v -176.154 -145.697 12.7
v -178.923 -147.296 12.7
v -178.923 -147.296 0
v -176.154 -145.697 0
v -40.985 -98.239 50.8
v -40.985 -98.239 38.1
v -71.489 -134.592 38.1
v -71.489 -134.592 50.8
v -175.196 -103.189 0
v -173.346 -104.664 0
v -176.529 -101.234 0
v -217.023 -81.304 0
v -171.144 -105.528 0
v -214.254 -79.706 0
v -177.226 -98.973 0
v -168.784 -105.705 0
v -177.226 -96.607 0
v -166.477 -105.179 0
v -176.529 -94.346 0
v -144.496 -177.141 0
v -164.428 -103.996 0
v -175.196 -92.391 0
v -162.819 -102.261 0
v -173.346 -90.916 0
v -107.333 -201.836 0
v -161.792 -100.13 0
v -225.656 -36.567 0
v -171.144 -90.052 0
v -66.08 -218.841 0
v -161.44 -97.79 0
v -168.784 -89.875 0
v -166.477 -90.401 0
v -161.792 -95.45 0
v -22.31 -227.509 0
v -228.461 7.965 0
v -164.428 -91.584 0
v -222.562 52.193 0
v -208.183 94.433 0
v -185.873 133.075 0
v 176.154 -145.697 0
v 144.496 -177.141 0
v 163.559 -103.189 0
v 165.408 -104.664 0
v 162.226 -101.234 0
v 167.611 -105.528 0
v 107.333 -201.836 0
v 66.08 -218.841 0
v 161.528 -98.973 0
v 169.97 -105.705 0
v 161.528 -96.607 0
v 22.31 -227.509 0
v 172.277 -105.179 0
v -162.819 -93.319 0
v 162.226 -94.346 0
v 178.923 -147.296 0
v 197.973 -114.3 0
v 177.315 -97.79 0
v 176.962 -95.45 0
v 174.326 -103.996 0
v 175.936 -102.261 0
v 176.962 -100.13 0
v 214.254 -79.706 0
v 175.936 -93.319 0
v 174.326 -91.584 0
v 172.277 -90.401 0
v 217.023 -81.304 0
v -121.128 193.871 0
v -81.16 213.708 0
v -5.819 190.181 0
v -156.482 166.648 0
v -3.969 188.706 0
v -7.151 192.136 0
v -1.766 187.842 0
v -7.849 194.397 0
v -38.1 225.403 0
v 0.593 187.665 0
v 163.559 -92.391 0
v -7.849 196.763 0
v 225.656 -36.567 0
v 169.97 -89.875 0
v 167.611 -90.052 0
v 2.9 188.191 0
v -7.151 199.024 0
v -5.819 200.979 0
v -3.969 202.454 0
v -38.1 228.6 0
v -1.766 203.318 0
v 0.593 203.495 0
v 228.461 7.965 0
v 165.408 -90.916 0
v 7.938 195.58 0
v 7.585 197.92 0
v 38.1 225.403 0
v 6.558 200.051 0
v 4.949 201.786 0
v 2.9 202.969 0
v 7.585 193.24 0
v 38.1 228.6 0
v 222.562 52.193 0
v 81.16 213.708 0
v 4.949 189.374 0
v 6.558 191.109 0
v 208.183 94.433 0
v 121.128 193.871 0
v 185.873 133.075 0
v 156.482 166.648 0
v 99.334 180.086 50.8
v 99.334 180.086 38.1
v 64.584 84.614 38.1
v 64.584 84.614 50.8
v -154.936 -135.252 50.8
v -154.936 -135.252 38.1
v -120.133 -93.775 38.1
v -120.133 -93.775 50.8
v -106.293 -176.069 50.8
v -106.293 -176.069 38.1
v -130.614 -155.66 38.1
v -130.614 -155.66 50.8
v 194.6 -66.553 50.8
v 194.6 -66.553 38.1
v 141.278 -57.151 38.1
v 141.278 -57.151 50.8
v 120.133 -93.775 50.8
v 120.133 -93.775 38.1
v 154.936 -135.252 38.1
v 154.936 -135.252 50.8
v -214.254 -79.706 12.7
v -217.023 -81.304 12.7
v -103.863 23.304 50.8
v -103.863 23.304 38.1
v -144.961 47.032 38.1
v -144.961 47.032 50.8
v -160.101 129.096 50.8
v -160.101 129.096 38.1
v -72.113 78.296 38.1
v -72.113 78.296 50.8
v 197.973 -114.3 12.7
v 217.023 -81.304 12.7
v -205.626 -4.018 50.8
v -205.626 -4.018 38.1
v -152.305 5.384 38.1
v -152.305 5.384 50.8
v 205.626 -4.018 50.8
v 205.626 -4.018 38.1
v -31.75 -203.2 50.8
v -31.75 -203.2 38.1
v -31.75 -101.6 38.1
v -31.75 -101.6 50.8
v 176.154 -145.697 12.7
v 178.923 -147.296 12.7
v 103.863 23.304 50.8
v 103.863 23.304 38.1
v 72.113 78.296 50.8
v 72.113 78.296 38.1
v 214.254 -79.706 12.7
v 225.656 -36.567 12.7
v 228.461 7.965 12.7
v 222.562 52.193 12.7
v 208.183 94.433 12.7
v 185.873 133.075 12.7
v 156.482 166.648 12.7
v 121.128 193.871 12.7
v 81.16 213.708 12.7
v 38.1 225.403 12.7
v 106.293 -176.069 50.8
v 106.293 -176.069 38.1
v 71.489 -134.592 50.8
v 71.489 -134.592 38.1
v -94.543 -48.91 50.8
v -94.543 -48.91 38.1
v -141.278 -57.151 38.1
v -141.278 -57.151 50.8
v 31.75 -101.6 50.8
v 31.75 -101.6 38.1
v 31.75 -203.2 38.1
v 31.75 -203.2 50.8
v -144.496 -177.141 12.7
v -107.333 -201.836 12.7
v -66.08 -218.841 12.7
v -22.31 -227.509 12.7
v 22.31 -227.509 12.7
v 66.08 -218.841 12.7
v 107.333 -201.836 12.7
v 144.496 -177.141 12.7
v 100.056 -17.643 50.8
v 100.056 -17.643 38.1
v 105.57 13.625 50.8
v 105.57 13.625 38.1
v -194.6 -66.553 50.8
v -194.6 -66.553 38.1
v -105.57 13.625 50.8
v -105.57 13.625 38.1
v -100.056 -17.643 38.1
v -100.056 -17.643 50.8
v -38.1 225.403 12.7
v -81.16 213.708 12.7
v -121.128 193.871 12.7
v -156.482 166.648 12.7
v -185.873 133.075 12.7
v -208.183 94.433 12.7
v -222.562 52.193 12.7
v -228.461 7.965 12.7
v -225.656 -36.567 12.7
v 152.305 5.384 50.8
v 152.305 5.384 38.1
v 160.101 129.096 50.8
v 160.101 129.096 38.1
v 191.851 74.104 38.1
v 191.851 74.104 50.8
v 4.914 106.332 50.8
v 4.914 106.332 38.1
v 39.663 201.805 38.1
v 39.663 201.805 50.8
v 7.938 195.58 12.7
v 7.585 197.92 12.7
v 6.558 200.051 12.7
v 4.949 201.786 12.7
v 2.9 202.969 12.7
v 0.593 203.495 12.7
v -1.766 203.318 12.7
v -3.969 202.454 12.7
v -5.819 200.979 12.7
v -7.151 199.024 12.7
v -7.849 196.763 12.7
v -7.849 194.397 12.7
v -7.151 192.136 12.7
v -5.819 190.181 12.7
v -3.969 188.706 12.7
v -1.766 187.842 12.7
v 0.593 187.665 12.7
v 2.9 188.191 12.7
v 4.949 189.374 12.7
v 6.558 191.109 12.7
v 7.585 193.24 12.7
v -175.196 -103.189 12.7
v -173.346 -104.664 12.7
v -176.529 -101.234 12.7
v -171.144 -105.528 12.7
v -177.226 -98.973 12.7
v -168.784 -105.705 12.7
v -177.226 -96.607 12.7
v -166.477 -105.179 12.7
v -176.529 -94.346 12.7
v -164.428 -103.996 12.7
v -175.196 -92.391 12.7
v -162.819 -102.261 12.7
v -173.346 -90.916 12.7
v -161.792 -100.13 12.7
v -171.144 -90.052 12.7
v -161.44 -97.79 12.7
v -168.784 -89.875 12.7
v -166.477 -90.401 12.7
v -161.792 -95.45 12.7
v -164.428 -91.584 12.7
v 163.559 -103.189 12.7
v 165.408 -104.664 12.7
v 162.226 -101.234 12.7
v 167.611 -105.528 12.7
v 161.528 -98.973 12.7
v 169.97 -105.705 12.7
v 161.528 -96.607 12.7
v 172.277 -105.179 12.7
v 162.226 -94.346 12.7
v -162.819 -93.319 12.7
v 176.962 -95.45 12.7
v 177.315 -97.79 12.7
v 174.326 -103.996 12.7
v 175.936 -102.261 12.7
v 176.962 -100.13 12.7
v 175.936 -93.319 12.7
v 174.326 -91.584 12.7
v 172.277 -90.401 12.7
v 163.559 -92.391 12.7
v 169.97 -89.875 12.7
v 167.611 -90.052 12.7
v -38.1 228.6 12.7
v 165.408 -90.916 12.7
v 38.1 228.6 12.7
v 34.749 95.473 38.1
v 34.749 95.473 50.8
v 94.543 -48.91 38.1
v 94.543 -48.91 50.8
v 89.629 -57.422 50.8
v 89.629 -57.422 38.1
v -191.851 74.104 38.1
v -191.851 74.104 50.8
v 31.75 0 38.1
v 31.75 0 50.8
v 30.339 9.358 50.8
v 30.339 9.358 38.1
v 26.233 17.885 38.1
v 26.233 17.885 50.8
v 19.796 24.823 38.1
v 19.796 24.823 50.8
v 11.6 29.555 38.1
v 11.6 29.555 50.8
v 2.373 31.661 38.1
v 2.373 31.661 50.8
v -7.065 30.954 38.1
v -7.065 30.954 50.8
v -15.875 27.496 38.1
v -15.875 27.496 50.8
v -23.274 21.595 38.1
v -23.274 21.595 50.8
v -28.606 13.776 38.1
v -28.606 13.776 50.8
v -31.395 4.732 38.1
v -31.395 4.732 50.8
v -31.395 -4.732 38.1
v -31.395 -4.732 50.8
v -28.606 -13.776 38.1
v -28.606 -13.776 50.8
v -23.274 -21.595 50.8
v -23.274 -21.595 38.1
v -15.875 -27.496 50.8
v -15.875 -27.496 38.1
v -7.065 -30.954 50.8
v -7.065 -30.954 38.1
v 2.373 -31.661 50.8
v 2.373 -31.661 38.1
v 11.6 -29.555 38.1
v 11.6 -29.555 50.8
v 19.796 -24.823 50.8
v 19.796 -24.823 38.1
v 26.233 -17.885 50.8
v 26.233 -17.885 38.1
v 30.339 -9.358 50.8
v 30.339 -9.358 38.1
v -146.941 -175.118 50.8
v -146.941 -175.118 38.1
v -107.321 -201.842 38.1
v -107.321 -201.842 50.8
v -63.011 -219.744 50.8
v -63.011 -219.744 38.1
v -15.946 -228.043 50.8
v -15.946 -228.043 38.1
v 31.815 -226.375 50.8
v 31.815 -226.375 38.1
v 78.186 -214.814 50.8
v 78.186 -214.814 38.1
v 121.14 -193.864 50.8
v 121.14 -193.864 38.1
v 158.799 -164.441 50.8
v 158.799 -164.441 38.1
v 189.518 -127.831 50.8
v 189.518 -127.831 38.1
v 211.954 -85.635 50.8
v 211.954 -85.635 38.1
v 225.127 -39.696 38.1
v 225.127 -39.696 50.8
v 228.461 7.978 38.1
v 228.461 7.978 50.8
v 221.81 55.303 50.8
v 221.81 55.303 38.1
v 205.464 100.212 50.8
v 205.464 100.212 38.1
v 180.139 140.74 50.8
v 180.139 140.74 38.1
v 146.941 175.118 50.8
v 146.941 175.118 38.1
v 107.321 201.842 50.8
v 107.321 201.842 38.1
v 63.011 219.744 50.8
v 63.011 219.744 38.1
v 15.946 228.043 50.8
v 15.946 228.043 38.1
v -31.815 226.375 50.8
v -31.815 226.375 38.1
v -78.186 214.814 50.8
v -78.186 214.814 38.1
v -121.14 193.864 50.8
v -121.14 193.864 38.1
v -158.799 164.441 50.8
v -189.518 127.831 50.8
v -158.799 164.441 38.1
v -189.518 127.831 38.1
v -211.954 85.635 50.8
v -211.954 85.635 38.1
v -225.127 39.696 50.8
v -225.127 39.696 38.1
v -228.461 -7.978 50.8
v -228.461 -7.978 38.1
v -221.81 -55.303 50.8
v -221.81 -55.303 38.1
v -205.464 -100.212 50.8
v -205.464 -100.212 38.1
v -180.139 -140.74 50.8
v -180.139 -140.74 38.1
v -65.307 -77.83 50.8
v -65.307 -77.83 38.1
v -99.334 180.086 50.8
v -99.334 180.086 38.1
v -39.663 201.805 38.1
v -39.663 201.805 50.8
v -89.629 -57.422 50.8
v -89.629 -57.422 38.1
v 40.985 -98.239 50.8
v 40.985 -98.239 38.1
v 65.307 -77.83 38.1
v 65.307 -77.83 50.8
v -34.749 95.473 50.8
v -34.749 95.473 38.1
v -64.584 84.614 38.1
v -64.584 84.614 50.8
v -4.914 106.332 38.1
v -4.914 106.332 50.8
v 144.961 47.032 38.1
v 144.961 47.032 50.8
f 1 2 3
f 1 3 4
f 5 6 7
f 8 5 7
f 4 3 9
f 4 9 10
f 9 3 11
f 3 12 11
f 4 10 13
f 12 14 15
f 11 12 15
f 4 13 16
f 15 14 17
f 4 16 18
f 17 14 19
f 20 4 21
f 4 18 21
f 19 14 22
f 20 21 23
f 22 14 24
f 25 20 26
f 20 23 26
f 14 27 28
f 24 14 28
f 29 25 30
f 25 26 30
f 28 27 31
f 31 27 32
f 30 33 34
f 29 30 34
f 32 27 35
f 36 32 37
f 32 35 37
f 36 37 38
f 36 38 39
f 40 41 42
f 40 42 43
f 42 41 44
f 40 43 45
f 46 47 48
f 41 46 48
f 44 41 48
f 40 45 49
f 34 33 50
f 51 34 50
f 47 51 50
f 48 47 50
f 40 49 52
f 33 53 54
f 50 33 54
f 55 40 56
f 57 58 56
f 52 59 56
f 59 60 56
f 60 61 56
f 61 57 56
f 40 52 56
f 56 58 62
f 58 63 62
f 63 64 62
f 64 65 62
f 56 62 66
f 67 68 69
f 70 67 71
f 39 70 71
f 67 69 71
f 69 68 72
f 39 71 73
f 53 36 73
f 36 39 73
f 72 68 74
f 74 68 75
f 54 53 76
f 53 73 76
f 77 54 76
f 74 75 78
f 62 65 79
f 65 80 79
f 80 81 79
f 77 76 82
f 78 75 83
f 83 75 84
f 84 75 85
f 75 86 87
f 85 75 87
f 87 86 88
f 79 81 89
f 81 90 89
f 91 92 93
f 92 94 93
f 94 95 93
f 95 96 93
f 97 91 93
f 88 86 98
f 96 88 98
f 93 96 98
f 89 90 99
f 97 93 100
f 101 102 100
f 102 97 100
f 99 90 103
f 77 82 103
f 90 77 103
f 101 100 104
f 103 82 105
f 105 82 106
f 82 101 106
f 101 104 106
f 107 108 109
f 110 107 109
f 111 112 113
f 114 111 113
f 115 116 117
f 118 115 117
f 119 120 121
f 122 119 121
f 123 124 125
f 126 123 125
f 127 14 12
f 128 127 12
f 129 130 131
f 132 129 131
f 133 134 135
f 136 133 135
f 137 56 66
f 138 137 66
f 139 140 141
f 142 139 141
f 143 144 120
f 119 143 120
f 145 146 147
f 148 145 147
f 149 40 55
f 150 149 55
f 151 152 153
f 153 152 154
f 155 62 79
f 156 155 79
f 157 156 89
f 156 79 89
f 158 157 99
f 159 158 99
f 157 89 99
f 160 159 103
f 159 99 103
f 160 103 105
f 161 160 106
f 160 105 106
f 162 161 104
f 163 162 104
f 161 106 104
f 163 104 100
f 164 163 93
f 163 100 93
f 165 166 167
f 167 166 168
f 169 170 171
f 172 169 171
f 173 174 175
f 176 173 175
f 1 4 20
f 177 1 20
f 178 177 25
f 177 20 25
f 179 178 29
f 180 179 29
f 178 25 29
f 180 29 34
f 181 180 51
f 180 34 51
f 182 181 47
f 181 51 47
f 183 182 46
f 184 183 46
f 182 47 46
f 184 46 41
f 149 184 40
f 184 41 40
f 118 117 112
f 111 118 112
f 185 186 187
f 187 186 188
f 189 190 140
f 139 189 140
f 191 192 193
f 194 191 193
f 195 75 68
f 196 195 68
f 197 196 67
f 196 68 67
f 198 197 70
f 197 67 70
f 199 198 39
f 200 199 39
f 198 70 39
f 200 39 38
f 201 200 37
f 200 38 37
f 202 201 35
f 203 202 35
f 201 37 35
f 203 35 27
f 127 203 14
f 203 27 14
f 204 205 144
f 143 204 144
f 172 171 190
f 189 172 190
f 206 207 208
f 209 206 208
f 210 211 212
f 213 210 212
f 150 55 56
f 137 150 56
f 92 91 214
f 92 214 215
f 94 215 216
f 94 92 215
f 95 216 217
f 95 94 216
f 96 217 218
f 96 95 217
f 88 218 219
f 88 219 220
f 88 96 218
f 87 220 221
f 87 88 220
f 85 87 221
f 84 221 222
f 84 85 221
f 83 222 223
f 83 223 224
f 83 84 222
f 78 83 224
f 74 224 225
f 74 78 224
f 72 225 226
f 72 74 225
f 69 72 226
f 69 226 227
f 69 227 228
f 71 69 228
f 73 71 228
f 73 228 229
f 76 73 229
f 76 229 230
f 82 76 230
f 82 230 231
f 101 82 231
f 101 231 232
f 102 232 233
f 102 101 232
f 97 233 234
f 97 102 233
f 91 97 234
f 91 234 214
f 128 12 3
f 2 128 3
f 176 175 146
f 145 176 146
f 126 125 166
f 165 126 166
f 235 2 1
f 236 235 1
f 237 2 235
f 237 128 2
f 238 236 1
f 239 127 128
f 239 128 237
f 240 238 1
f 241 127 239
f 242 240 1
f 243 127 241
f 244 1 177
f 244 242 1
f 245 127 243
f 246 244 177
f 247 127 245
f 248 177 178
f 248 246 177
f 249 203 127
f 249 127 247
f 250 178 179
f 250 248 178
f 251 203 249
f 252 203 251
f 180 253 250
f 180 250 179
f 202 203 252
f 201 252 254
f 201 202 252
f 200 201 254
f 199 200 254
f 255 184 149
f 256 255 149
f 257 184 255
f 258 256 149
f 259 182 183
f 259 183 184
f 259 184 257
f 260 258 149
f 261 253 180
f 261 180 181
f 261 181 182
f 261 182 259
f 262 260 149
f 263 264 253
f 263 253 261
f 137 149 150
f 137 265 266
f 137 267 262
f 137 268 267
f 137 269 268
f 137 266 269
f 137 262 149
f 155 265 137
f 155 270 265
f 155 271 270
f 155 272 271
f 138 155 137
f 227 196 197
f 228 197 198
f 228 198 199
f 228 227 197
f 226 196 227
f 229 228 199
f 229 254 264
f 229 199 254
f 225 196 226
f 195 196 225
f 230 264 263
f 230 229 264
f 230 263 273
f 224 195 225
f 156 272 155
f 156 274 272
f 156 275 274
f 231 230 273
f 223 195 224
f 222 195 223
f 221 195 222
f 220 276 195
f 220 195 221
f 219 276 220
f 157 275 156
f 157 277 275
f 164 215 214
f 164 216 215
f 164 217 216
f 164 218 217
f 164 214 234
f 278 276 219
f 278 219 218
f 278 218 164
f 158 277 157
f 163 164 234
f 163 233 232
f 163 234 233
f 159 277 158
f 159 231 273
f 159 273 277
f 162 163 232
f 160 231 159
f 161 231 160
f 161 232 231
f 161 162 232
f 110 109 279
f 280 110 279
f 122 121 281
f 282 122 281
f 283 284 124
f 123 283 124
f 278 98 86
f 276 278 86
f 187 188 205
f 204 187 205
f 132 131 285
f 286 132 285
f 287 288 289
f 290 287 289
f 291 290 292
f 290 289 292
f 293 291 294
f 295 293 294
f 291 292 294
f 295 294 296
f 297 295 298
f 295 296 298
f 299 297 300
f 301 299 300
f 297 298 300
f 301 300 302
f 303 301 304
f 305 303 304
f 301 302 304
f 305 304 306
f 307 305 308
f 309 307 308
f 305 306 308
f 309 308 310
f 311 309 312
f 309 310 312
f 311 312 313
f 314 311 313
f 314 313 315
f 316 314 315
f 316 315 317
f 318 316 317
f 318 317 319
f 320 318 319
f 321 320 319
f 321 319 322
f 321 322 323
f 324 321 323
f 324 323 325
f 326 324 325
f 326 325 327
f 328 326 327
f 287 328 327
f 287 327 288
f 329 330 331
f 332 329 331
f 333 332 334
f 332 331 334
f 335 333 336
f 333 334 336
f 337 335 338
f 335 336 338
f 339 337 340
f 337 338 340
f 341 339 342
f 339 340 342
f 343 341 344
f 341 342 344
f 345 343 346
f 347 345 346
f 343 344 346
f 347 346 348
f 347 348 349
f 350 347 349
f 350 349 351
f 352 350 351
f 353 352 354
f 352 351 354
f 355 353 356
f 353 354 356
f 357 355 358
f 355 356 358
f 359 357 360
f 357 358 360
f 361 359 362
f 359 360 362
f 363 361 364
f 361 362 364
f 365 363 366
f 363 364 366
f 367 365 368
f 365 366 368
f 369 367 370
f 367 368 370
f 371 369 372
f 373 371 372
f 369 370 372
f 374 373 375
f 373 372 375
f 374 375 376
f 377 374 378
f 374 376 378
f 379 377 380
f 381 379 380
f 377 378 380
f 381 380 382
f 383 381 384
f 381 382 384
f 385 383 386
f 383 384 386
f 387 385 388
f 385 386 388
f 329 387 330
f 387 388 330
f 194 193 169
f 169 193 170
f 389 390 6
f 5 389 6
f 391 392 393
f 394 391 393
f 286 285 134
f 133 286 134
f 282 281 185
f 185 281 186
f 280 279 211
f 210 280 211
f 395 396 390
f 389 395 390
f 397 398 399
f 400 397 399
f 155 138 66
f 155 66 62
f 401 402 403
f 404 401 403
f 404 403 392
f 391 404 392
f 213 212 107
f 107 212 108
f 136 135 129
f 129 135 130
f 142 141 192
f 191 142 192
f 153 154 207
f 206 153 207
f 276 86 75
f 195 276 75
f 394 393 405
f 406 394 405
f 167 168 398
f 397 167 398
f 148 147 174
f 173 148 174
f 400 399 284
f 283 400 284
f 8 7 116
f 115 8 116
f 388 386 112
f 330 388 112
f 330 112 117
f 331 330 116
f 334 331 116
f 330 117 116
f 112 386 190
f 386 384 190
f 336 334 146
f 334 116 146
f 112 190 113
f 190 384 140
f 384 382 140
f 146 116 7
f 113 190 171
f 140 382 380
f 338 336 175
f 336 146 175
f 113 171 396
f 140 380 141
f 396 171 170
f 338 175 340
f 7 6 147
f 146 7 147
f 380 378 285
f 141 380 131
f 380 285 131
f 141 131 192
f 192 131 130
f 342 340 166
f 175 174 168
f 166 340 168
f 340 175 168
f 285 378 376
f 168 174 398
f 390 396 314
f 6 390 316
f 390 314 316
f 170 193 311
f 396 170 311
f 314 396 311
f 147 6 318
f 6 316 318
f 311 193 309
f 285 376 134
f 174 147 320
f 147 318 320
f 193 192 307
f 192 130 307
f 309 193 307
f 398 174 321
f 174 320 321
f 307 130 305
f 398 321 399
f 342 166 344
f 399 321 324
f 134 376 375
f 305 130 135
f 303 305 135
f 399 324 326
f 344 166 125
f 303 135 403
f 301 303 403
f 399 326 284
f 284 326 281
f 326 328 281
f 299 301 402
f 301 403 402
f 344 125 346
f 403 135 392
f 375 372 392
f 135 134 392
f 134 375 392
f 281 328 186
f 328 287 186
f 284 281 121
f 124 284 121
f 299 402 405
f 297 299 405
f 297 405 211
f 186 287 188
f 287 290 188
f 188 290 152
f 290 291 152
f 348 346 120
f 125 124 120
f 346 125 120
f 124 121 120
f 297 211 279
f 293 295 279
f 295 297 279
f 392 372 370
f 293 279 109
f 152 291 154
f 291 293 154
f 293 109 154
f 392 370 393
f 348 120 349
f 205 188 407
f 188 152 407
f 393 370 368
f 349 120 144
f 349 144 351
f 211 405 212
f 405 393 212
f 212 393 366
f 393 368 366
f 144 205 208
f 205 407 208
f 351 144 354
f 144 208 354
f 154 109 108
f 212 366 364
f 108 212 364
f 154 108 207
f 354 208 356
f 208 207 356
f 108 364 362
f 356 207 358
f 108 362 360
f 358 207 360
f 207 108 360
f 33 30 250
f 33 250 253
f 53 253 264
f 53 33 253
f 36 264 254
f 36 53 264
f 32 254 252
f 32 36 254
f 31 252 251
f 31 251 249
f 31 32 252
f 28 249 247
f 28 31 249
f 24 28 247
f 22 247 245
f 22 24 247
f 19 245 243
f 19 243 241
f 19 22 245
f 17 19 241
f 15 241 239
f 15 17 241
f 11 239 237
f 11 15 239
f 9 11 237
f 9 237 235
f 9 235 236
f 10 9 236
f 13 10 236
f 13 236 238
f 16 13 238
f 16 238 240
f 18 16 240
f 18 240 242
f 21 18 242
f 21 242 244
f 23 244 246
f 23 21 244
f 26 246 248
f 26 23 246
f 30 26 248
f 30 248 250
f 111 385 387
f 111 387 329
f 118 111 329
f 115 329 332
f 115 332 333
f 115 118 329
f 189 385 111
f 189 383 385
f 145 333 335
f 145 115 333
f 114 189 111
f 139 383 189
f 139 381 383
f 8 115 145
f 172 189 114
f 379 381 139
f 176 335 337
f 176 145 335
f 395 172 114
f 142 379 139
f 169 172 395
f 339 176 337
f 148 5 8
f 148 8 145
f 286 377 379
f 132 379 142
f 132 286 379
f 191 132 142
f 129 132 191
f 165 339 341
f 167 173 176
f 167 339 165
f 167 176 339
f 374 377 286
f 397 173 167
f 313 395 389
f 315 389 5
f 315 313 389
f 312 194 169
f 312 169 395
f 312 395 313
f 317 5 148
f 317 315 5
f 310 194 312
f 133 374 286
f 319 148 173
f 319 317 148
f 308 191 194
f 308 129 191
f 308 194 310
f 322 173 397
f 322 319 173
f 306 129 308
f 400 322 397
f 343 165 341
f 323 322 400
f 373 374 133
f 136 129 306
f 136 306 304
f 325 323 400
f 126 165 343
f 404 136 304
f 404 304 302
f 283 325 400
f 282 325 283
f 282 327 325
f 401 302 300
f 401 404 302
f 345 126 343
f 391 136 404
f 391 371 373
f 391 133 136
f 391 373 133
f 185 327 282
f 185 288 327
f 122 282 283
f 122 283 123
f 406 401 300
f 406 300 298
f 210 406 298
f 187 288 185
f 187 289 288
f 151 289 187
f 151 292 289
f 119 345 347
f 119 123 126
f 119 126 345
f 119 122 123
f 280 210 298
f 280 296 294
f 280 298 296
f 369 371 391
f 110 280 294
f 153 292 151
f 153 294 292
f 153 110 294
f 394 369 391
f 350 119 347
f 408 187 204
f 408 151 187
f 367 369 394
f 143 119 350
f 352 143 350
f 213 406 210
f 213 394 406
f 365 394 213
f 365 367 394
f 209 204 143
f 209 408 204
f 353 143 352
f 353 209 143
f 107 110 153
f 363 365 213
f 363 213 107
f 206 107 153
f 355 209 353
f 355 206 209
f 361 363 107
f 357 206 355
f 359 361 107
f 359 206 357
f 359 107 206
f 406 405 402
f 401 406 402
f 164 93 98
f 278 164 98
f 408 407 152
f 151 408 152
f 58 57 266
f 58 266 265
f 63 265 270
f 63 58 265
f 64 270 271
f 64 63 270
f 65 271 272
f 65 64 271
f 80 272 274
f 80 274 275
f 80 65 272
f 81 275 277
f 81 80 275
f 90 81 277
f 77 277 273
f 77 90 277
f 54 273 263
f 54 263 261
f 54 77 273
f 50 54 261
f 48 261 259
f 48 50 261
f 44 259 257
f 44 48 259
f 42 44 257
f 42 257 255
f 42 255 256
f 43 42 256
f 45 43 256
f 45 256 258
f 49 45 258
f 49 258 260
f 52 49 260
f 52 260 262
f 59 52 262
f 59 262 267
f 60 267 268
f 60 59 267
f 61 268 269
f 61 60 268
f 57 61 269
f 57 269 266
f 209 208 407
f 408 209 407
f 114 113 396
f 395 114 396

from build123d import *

# Parameters (mm, degrees)
F0_R     = 7.9375
F1_DEPTH = 12.7
F2_R     = 7.9375
F3_DEPTH = 12.7
F6_DEPTH = 12.7
F7_R     = 31.75
F8_DEPTH = 25.4


with BuildPart() as f1:
    # F0 (on Top) → F1 (new body)
    with BuildSketch(Plane.XY):
        with BuildLine():
            Line((-38.1, 225.4026397361), (-38.1, 147.5606654905))
            ThreePointArc((-38.1, 147.5606654905), (-131.9822715367, 76.2), (-146.8412849141, -40.7847648611))
            Line((-146.8412849141, -40.7847648611), (-214.2544120915, -79.7057519839))
            ThreePointArc((-214.2544120915, -79.7057519839), (-206.8384260613, -97.343851909), (-197.9734085849, -114.2999977833))
            ThreePointArc((-197.9734085849, -114.2999977833), (-187.7214631468, -130.4554033915), (-176.1544120915, -145.6968877522))
            Line((-176.1544120915, -145.6968877522), (-108.7412849141, -106.7759006294))
            ThreePointArc((-108.7412849141, -106.7759006294), (0, -152.4), (108.7412849141, -106.7759006294))
            Line((108.7412849141, -106.7759006294), (176.1544120915, -145.6968877522))
            ThreePointArc((176.1544120915, -145.6968877522), (187.7214632552, -130.4554032355), (197.973408775, -114.2999974542))
            ThreePointArc((197.973408775, -114.2999974542), (206.8384261422, -97.343851737), (214.2544120915, -79.7057519839))
            Line((214.2544120915, -79.7057519839), (146.8412849141, -40.7847648611))
            ThreePointArc((146.8412849141, -40.7847648611), (131.9822715367, 76.2), (38.1, 147.5606654905))
            Line((38.1, 147.5606654905), (38.1, 225.4026397361))
            ThreePointArc((38.1, 225.4026397361), (19.1169634699, 227.7992574784), (7.425e-07, 228.6))
            ThreePointArc((7.425e-07, 228.6), (-19.11696273, 227.7992575405), (-38.1, 225.4026397361))
        make_face()
        with Locations((-169.3772484722, -97.79)):
            Circle(F0_R, mode=Mode.SUBTRACT)
        with Locations((169.3772484722, -97.79)):
            Circle(F0_R, mode=Mode.SUBTRACT)
        with Locations((0, 195.58)):
            Circle(F0_R, mode=Mode.SUBTRACT)
        with BuildLine():
            ThreePointArc((-146.8412849141, -40.7847648611), (-131.9822715367, 76.2), (-38.1, 147.5606654905))
            Line((-38.1, 147.5606654905), (-38.1, 225.4026397361))
            ThreePointArc((-38.1, 225.4026397361), (-197.9734073051, 114.3), (-214.2544120915, -79.7057519839))
            Line((-214.2544120915, -79.7057519839), (-146.8412849141, -40.7847648611))
        make_face()
        with BuildLine():
            Line((-38.1, 228.6), (-38.1, 225.4026397361))
            ThreePointArc((-38.1, 225.4026397361), (-19.11696273, 227.7992575405), (7.425e-07, 228.6))
            Line((7.425e-07, 228.6), (-38.1, 228.6))
        make_face()
        with BuildLine():
            ThreePointArc((-197.9734085849, -114.2999977833), (-206.8384260613, -97.343851909), (-214.2544120915, -79.7057519839))
            Line((-214.2544120915, -79.7057519839), (-217.0234073051, -81.3044321158))
            Line((-217.0234073051, -81.3044321158), (-197.9734085849, -114.2999977833))
        make_face()
        with BuildLine():
            Line((38.1, 228.6), (7.425e-07, 228.6))
            ThreePointArc((7.425e-07, 228.6), (19.1169634699, 227.7992574784), (38.1, 225.4026397361))
            Line((38.1, 225.4026397361), (38.1, 228.6))
        make_face()
        with BuildLine():
            ThreePointArc((-176.1544120915, -145.6968877522), (-187.7214631468, -130.4554033915), (-197.9734085849, -114.2999977833))
            Line((-197.9734085849, -114.2999977833), (-178.9234073051, -147.2955678842))
            Line((-178.9234073051, -147.2955678842), (-176.1544120915, -145.6968877522))
        make_face()
        with BuildLine():
            ThreePointArc((228.6, 0), (174.5961339778, 147.5606654905), (38.1, 225.4026397361))
            Line((38.1, 225.4026397361), (38.1, 147.5606654905))
            ThreePointArc((38.1, 147.5606654905), (131.9822715367, 76.2), (146.8412849141, -40.7847648611))
            Line((146.8412849141, -40.7847648611), (214.2544120915, -79.7057519839))
            ThreePointArc((214.2544120915, -79.7057519839), (224.9850201726, -40.4932179252), (228.6, 0))
        make_face()
        with BuildLine():
            Line((-108.7412849141, -106.7759006294), (-176.1544120915, -145.6968877522))
            ThreePointArc((-176.1544120915, -145.6968877522), (0, -228.6), (176.1544120915, -145.6968877522))
            Line((176.1544120915, -145.6968877522), (108.7412849141, -106.7759006294))
            ThreePointArc((108.7412849141, -106.7759006294), (0, -152.4), (-108.7412849141, -106.7759006294))
        make_face()
        with BuildLine():
            ThreePointArc((197.973408775, -114.2999974542), (187.7214632552, -130.4554032355), (176.1544120915, -145.6968877522))
            Line((176.1544120915, -145.6968877522), (178.9234073051, -147.2955678842))
            Line((178.9234073051, -147.2955678842), (197.973408775, -114.2999974542))
        make_face()
        with BuildLine():
            Line((217.0234073051, -81.3044321158), (214.2544120915, -79.7057519839))
            ThreePointArc((214.2544120915, -79.7057519839), (206.8384261422, -97.343851737), (197.973408775, -114.2999974542))
            Line((197.973408775, -114.2999974542), (217.0234073051, -81.3044321158))
        make_face()
    extrude(amount=F1_DEPTH)

    # F2 (on face) → F3 (join)
    with BuildSketch(Plane.XY.offset(12.7)):
        with BuildLine():
            ThreePointArc((214.2544120915, -79.7057519839), (224.9850201726, -40.4932179252), (228.6, 0))
            ThreePointArc((228.6, 0), (174.5961339778, 147.5606654905), (38.1, 225.4026397361))
            ThreePointArc((38.1, 225.4026397361), (19.1169634699, 227.7992574784), (7.425e-07, 228.6))
            ThreePointArc((7.425e-07, 228.6), (-19.11696273, 227.7992575405), (-38.1, 225.4026397361))
            ThreePointArc((-38.1, 225.4026397361), (-197.9734073051, 114.3), (-214.2544120915, -79.7057519839))
            ThreePointArc((-214.2544120915, -79.7057519839), (-206.8384257006, -97.3438526754), (-197.9734077379, -114.2999992504))
            ThreePointArc((-197.9734077379, -114.2999992504), (-187.7214626634, -130.4554040871), (-176.1544120915, -145.6968877522))
            ThreePointArc((-176.1544120915, -145.6968877522), (0, -228.6), (176.1544120915, -145.6968877522))
            ThreePointArc((176.1544120915, -145.6968877522), (187.7214619736, -130.4554050796), (197.9734065292, -114.3000013439))
            ThreePointArc((197.9734065292, -114.3000013439), (206.8384251859, -97.343853769), (214.2544120915, -79.7057519839))
        make_face()
        with Locations((-169.3772484722, -97.79)):
            Circle(F2_R, mode=Mode.SUBTRACT)
        with Locations((169.3772484722, -97.79)):
            Circle(F2_R, mode=Mode.SUBTRACT)
        Polygon((56.9597219464, 89.9039963502), (26.2960149824, 98.138063951), (-4.3721300023, 106.355568633), (21.9238849802, 204.4936325839), (83.2601749495, 188.0586232199), (56.9641599671, 89.920559269), align=None, mode=Mode.SUBTRACT)
        with Locations((0, 195.58)):
            Circle(F2_R, mode=Mode.SUBTRACT)
        Polygon((-4.3721300023, 106.355568633), (26.2960149824, 98.138063951), (56.9597219464, 89.9039963502), (56.9641599671, 89.920559269), (83.2601749495, 188.0586232199), (21.9238849802, 204.4936325839), align=None)
    extrude(amount=-F3_DEPTH)


with BuildPart() as f6:
    # F5 (on offset) → F6 (new body)
    with BuildSketch(Plane.XY.offset(38.1)):
        with BuildLine():
            ThreePointArc((0, -228.6), (161.6446101792, -161.6446101792), (228.6, 0))
            ThreePointArc((228.6, 0), (-96.6105346339, 207.1819601166), (-146.9412475743, -175.117759697))
            Line((-146.9412475743, -175.117759697), (-130.6144422883, -155.6602308418))
            Line((-130.6144422883, -155.6602308418), (-154.9363533573, -135.2517242342))
            Line((-154.9363533573, -135.2517242342), (-120.1332747405, -93.7750302593))
            ThreePointArc((-120.1332747405, -93.7750302593), (-131.9822715367, -76.2), (-141.2781958154, -57.1509526354))
            Line((-141.2781958154, -57.1509526354), (-194.5996057712, -66.5529558601))
            Line((-194.5996057712, -66.5529558601), (-205.626265053, -4.0176635438))
            Line((-205.626265053, -4.0176635438), (-152.3048550973, 5.3843396808))
            ThreePointArc((-152.3048550973, 5.3843396808), (-150.0847015591, 26.4639822764), (-144.9613010741, 47.0317041037))
            Line((-144.9613010741, 47.0317041037), (-191.851362049, 74.1036934298))
            Line((-191.851362049, 74.1036934298), (-160.101362049, 129.0963065702))
            Line((-160.101362049, 129.0963065702), (-113.2113010741, 102.024317244))
            ThreePointArc((-113.2113010741, 102.024317244), (-97.9608317162, 116.7451731313), (-80.8154024948, 129.2077037935))
            Line((-80.8154024948, 129.2077037935), (-99.3337338337, 180.0864009931))
            Line((-99.3337338337, 180.0864009931), (-39.6632524138, 201.8046800943))
            Line((-39.6632524138, 201.8046800943), (-21.1449210749, 150.9259828947))
            ThreePointArc((-21.1449210749, 150.9259828947), (0, 152.4), (21.1449210749, 150.9259828947))
            Line((21.1449210749, 150.9259828947), (39.6632524138, 201.8046800943))
            Line((39.6632524138, 201.8046800943), (99.3337338337, 180.0864009931))
            Line((99.3337338337, 180.0864009931), (80.8154024948, 129.2077037935))
            ThreePointArc((80.8154024948, 129.2077037935), (97.9608317162, 116.7451731313), (113.2113010741, 102.024317244))
            Line((113.2113010741, 102.024317244), (160.101362049, 129.0963065702))
            Line((160.101362049, 129.0963065702), (191.851362049, 74.1036934298))
            Line((191.851362049, 74.1036934298), (144.9613010741, 47.0317041037))
            ThreePointArc((144.9613010741, 47.0317041037), (150.0847015591, 26.4639822764), (152.3048550973, 5.3843396808))
            Line((152.3048550973, 5.3843396808), (205.626265053, -4.0176635438))
            Line((205.626265053, -4.0176635438), (194.5996057712, -66.5529558601))
            Line((194.5996057712, -66.5529558601), (141.2781958154, -57.1509526354))
            ThreePointArc((141.2781958154, -57.1509526354), (131.9822715368, -76.2), (120.1332747405, -93.7750302593))
            Line((120.1332747405, -93.7750302593), (154.9363533573, -135.2517242342))
            Line((154.9363533573, -135.2517242342), (106.2925312193, -176.0687374493))
            Line((106.2925312193, -176.0687374493), (71.4894526024, -134.5920434744))
            ThreePointArc((71.4894526024, -134.5920434744), (52.1238698428, -143.2091554078), (31.75, -149.0560213477))
            Line((31.75, -149.0560213477), (31.75, -203.2))
            Line((31.75, -203.2), (0, -203.2))
            Line((0, -203.2), (0, -228.6))
        make_face()
        with BuildLine():
            Line((-130.6144422883, -155.6602308418), (-146.9412475743, -175.117759697))
            ThreePointArc((-146.9412475743, -175.117759697), (-78.1858047642, -214.8137331117), (0, -228.6))
            Line((0, -228.6), (0, -203.2))
            Line((0, -203.2), (-31.75, -203.2))
            Line((-31.75, -203.2), (-31.75, -149.0560213477))
            ThreePointArc((-31.75, -149.0560213477), (-52.1238698428, -143.2091554078), (-71.4894526024, -134.5920434744))
            Line((-71.4894526024, -134.5920434744), (-106.2925312193, -176.0687374493))
            Line((-106.2925312193, -176.0687374493), (-130.6144422883, -155.6602308418))
        make_face()
        with BuildLine():
            Line((0, 0), (-65.3072211442, -77.8301154209))
            Line((-65.3072211442, -77.8301154209), (-40.9853100751, -98.2386220284))
            Line((-40.9853100751, -98.2386220284), (-71.4894526024, -134.5920434744))
            ThreePointArc((-71.4894526024, -134.5920434744), (-52.1238698428, -143.2091554078), (-31.75, -149.0560213477))
            Line((-31.75, -149.0560213477), (-31.75, -101.6))
            Line((-31.75, -101.6), (0, -101.6))
            Line((0, -101.6), (0, 0))
        make_face()
        with BuildLine():
            Line((-89.6291322132, -57.4216088133), (-65.3072211442, -77.8301154209))
            Line((-65.3072211442, -77.8301154209), (0, 0))
            Line((0, 0), (0, -101.6))
            Line((0, -101.6), (31.75, -101.6))
            Line((31.75, -101.6), (31.75, -149.0560213477))
            ThreePointArc((31.75, -149.0560213477), (52.1238698428, -143.2091554078), (71.4894526024, -134.5920434744))
            Line((71.4894526024, -134.5920434744), (40.9853100751, -98.2386220284))
            Line((40.9853100751, -98.2386220284), (65.3072211442, -77.8301154209))
            Line((65.3072211442, -77.8301154209), (89.6291322132, -57.4216088133))
            Line((89.6291322132, -57.4216088133), (120.1332747405, -93.7750302593))
            ThreePointArc((120.1332747405, -93.7750302593), (131.9822715368, -76.2), (141.2781958154, -57.1509526354))
            Line((141.2781958154, -57.1509526354), (94.5431380651, -48.9103010091))
            Line((94.5431380651, -48.9103010091), (100.056467706, -17.642654851))
            Line((100.056467706, -17.642654851), (105.569797347, 13.6249913072))
            Line((105.569797347, 13.6249913072), (152.3048550973, 5.3843396808))
            ThreePointArc((152.3048550973, 5.3843396808), (150.0847015591, 26.4639822764), (144.9613010741, 47.0317041037))
            Line((144.9613010741, 47.0317041037), (103.8631810245, 23.3036934298))
            Line((103.8631810245, 23.3036934298), (87.9881810245, 50.8))
            Line((87.9881810245, 50.8), (72.1131810245, 78.2963065702))
            Line((72.1131810245, 78.2963065702), (113.2113010741, 102.024317244))
            ThreePointArc((113.2113010741, 102.024317244), (97.9608317162, 116.7451731313), (80.8154024948, 129.2077037935))
            Line((80.8154024948, 129.2077037935), (64.5844872718, 84.6136307213))
            Line((64.5844872718, 84.6136307213), (34.7492465619, 95.4727702718))
            Line((34.7492465619, 95.4727702718), (4.9140058519, 106.3319098224))
            Line((4.9140058519, 106.3319098224), (21.1449210749, 150.9259828947))
            ThreePointArc((21.1449210749, 150.9259828947), (0, 152.4), (-21.1449210749, 150.9259828947))
            Line((-21.1449210749, 150.9259828947), (-4.9140058519, 106.3319098224))
            Line((-4.9140058519, 106.3319098224), (-34.7492465619, 95.4727702718))
            Line((-34.7492465619, 95.4727702718), (-64.5844872718, 84.6136307213))
            Line((-64.5844872718, 84.6136307213), (-80.8154024948, 129.2077037935))
            ThreePointArc((-80.8154024948, 129.2077037935), (-97.9608317162, 116.7451731313), (-113.2113010741, 102.024317244))
            Line((-113.2113010741, 102.024317244), (-72.1131810245, 78.2963065702))
            Line((-72.1131810245, 78.2963065702), (-87.9881810245, 50.8))
            Line((-87.9881810245, 50.8), (-103.8631810245, 23.3036934298))
            Line((-103.8631810245, 23.3036934298), (-144.9613010741, 47.0317041037))
            ThreePointArc((-144.9613010741, 47.0317041037), (-150.0847015591, 26.4639822764), (-152.3048550973, 5.3843396808))
            Line((-152.3048550973, 5.3843396808), (-105.569797347, 13.6249913072))
            Line((-105.569797347, 13.6249913072), (-100.056467706, -17.642654851))
            Line((-100.056467706, -17.642654851), (-94.5431380651, -48.9103010091))
            Line((-94.5431380651, -48.9103010091), (-141.2781958154, -57.1509526354))
            ThreePointArc((-141.2781958154, -57.1509526354), (-131.9822715367, -76.2), (-120.1332747405, -93.7750302593))
            Line((-120.1332747405, -93.7750302593), (-89.6291322132, -57.4216088133))
        make_face()
    extrude(amount=F6_DEPTH)

    # F7 (on face) → F8 (cut)
    with BuildSketch(Plane.XY.offset(50.8)):
        Circle(F7_R)
    extrude(amount=-F8_DEPTH, mode=Mode.SUBTRACT)


solid = Compound([f1.part, f6.part])
